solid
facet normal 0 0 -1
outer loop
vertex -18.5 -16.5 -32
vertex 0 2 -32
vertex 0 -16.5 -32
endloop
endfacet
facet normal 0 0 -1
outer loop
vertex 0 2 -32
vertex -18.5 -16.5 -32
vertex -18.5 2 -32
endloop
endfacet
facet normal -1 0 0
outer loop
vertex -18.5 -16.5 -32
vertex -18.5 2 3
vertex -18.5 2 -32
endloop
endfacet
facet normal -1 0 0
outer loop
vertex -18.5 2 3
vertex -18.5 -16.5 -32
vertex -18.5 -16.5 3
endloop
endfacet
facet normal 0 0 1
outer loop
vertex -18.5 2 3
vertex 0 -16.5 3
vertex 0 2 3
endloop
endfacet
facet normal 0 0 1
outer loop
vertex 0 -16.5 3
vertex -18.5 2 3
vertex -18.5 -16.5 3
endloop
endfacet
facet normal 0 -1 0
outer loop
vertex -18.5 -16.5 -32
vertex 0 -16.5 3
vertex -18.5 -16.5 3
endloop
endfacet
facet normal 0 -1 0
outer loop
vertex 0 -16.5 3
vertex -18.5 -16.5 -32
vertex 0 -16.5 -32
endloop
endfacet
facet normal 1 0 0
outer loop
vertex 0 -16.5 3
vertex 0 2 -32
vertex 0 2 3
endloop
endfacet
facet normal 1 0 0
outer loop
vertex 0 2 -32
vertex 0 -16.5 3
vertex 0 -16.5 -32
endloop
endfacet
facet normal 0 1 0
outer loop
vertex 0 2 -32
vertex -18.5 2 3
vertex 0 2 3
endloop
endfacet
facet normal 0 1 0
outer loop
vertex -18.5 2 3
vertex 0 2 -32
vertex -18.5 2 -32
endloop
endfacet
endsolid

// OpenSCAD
h = [12.5, 5.2, 3];

wood_d = 18.5;

mirror([0, 1, 0])
difference() {
    translate([-wood_d/2, wood_d/2-2, -35+3])
    linear_extrude(35)
    square([wood_d, wood_d], center=true);
    * spacer();
    #translate([1.5/2, 0, 0])
    linear_extrude(5)
    mirror([0, 1, 0])
    import("/home/michalz/drawing2.dxf");
}

module spacer() {
    color("red")
    translate([-h.x + h.y/2, -3.3, 0])
    linear_extrude(10)
    square([h.y, h.z], center=true);
}
